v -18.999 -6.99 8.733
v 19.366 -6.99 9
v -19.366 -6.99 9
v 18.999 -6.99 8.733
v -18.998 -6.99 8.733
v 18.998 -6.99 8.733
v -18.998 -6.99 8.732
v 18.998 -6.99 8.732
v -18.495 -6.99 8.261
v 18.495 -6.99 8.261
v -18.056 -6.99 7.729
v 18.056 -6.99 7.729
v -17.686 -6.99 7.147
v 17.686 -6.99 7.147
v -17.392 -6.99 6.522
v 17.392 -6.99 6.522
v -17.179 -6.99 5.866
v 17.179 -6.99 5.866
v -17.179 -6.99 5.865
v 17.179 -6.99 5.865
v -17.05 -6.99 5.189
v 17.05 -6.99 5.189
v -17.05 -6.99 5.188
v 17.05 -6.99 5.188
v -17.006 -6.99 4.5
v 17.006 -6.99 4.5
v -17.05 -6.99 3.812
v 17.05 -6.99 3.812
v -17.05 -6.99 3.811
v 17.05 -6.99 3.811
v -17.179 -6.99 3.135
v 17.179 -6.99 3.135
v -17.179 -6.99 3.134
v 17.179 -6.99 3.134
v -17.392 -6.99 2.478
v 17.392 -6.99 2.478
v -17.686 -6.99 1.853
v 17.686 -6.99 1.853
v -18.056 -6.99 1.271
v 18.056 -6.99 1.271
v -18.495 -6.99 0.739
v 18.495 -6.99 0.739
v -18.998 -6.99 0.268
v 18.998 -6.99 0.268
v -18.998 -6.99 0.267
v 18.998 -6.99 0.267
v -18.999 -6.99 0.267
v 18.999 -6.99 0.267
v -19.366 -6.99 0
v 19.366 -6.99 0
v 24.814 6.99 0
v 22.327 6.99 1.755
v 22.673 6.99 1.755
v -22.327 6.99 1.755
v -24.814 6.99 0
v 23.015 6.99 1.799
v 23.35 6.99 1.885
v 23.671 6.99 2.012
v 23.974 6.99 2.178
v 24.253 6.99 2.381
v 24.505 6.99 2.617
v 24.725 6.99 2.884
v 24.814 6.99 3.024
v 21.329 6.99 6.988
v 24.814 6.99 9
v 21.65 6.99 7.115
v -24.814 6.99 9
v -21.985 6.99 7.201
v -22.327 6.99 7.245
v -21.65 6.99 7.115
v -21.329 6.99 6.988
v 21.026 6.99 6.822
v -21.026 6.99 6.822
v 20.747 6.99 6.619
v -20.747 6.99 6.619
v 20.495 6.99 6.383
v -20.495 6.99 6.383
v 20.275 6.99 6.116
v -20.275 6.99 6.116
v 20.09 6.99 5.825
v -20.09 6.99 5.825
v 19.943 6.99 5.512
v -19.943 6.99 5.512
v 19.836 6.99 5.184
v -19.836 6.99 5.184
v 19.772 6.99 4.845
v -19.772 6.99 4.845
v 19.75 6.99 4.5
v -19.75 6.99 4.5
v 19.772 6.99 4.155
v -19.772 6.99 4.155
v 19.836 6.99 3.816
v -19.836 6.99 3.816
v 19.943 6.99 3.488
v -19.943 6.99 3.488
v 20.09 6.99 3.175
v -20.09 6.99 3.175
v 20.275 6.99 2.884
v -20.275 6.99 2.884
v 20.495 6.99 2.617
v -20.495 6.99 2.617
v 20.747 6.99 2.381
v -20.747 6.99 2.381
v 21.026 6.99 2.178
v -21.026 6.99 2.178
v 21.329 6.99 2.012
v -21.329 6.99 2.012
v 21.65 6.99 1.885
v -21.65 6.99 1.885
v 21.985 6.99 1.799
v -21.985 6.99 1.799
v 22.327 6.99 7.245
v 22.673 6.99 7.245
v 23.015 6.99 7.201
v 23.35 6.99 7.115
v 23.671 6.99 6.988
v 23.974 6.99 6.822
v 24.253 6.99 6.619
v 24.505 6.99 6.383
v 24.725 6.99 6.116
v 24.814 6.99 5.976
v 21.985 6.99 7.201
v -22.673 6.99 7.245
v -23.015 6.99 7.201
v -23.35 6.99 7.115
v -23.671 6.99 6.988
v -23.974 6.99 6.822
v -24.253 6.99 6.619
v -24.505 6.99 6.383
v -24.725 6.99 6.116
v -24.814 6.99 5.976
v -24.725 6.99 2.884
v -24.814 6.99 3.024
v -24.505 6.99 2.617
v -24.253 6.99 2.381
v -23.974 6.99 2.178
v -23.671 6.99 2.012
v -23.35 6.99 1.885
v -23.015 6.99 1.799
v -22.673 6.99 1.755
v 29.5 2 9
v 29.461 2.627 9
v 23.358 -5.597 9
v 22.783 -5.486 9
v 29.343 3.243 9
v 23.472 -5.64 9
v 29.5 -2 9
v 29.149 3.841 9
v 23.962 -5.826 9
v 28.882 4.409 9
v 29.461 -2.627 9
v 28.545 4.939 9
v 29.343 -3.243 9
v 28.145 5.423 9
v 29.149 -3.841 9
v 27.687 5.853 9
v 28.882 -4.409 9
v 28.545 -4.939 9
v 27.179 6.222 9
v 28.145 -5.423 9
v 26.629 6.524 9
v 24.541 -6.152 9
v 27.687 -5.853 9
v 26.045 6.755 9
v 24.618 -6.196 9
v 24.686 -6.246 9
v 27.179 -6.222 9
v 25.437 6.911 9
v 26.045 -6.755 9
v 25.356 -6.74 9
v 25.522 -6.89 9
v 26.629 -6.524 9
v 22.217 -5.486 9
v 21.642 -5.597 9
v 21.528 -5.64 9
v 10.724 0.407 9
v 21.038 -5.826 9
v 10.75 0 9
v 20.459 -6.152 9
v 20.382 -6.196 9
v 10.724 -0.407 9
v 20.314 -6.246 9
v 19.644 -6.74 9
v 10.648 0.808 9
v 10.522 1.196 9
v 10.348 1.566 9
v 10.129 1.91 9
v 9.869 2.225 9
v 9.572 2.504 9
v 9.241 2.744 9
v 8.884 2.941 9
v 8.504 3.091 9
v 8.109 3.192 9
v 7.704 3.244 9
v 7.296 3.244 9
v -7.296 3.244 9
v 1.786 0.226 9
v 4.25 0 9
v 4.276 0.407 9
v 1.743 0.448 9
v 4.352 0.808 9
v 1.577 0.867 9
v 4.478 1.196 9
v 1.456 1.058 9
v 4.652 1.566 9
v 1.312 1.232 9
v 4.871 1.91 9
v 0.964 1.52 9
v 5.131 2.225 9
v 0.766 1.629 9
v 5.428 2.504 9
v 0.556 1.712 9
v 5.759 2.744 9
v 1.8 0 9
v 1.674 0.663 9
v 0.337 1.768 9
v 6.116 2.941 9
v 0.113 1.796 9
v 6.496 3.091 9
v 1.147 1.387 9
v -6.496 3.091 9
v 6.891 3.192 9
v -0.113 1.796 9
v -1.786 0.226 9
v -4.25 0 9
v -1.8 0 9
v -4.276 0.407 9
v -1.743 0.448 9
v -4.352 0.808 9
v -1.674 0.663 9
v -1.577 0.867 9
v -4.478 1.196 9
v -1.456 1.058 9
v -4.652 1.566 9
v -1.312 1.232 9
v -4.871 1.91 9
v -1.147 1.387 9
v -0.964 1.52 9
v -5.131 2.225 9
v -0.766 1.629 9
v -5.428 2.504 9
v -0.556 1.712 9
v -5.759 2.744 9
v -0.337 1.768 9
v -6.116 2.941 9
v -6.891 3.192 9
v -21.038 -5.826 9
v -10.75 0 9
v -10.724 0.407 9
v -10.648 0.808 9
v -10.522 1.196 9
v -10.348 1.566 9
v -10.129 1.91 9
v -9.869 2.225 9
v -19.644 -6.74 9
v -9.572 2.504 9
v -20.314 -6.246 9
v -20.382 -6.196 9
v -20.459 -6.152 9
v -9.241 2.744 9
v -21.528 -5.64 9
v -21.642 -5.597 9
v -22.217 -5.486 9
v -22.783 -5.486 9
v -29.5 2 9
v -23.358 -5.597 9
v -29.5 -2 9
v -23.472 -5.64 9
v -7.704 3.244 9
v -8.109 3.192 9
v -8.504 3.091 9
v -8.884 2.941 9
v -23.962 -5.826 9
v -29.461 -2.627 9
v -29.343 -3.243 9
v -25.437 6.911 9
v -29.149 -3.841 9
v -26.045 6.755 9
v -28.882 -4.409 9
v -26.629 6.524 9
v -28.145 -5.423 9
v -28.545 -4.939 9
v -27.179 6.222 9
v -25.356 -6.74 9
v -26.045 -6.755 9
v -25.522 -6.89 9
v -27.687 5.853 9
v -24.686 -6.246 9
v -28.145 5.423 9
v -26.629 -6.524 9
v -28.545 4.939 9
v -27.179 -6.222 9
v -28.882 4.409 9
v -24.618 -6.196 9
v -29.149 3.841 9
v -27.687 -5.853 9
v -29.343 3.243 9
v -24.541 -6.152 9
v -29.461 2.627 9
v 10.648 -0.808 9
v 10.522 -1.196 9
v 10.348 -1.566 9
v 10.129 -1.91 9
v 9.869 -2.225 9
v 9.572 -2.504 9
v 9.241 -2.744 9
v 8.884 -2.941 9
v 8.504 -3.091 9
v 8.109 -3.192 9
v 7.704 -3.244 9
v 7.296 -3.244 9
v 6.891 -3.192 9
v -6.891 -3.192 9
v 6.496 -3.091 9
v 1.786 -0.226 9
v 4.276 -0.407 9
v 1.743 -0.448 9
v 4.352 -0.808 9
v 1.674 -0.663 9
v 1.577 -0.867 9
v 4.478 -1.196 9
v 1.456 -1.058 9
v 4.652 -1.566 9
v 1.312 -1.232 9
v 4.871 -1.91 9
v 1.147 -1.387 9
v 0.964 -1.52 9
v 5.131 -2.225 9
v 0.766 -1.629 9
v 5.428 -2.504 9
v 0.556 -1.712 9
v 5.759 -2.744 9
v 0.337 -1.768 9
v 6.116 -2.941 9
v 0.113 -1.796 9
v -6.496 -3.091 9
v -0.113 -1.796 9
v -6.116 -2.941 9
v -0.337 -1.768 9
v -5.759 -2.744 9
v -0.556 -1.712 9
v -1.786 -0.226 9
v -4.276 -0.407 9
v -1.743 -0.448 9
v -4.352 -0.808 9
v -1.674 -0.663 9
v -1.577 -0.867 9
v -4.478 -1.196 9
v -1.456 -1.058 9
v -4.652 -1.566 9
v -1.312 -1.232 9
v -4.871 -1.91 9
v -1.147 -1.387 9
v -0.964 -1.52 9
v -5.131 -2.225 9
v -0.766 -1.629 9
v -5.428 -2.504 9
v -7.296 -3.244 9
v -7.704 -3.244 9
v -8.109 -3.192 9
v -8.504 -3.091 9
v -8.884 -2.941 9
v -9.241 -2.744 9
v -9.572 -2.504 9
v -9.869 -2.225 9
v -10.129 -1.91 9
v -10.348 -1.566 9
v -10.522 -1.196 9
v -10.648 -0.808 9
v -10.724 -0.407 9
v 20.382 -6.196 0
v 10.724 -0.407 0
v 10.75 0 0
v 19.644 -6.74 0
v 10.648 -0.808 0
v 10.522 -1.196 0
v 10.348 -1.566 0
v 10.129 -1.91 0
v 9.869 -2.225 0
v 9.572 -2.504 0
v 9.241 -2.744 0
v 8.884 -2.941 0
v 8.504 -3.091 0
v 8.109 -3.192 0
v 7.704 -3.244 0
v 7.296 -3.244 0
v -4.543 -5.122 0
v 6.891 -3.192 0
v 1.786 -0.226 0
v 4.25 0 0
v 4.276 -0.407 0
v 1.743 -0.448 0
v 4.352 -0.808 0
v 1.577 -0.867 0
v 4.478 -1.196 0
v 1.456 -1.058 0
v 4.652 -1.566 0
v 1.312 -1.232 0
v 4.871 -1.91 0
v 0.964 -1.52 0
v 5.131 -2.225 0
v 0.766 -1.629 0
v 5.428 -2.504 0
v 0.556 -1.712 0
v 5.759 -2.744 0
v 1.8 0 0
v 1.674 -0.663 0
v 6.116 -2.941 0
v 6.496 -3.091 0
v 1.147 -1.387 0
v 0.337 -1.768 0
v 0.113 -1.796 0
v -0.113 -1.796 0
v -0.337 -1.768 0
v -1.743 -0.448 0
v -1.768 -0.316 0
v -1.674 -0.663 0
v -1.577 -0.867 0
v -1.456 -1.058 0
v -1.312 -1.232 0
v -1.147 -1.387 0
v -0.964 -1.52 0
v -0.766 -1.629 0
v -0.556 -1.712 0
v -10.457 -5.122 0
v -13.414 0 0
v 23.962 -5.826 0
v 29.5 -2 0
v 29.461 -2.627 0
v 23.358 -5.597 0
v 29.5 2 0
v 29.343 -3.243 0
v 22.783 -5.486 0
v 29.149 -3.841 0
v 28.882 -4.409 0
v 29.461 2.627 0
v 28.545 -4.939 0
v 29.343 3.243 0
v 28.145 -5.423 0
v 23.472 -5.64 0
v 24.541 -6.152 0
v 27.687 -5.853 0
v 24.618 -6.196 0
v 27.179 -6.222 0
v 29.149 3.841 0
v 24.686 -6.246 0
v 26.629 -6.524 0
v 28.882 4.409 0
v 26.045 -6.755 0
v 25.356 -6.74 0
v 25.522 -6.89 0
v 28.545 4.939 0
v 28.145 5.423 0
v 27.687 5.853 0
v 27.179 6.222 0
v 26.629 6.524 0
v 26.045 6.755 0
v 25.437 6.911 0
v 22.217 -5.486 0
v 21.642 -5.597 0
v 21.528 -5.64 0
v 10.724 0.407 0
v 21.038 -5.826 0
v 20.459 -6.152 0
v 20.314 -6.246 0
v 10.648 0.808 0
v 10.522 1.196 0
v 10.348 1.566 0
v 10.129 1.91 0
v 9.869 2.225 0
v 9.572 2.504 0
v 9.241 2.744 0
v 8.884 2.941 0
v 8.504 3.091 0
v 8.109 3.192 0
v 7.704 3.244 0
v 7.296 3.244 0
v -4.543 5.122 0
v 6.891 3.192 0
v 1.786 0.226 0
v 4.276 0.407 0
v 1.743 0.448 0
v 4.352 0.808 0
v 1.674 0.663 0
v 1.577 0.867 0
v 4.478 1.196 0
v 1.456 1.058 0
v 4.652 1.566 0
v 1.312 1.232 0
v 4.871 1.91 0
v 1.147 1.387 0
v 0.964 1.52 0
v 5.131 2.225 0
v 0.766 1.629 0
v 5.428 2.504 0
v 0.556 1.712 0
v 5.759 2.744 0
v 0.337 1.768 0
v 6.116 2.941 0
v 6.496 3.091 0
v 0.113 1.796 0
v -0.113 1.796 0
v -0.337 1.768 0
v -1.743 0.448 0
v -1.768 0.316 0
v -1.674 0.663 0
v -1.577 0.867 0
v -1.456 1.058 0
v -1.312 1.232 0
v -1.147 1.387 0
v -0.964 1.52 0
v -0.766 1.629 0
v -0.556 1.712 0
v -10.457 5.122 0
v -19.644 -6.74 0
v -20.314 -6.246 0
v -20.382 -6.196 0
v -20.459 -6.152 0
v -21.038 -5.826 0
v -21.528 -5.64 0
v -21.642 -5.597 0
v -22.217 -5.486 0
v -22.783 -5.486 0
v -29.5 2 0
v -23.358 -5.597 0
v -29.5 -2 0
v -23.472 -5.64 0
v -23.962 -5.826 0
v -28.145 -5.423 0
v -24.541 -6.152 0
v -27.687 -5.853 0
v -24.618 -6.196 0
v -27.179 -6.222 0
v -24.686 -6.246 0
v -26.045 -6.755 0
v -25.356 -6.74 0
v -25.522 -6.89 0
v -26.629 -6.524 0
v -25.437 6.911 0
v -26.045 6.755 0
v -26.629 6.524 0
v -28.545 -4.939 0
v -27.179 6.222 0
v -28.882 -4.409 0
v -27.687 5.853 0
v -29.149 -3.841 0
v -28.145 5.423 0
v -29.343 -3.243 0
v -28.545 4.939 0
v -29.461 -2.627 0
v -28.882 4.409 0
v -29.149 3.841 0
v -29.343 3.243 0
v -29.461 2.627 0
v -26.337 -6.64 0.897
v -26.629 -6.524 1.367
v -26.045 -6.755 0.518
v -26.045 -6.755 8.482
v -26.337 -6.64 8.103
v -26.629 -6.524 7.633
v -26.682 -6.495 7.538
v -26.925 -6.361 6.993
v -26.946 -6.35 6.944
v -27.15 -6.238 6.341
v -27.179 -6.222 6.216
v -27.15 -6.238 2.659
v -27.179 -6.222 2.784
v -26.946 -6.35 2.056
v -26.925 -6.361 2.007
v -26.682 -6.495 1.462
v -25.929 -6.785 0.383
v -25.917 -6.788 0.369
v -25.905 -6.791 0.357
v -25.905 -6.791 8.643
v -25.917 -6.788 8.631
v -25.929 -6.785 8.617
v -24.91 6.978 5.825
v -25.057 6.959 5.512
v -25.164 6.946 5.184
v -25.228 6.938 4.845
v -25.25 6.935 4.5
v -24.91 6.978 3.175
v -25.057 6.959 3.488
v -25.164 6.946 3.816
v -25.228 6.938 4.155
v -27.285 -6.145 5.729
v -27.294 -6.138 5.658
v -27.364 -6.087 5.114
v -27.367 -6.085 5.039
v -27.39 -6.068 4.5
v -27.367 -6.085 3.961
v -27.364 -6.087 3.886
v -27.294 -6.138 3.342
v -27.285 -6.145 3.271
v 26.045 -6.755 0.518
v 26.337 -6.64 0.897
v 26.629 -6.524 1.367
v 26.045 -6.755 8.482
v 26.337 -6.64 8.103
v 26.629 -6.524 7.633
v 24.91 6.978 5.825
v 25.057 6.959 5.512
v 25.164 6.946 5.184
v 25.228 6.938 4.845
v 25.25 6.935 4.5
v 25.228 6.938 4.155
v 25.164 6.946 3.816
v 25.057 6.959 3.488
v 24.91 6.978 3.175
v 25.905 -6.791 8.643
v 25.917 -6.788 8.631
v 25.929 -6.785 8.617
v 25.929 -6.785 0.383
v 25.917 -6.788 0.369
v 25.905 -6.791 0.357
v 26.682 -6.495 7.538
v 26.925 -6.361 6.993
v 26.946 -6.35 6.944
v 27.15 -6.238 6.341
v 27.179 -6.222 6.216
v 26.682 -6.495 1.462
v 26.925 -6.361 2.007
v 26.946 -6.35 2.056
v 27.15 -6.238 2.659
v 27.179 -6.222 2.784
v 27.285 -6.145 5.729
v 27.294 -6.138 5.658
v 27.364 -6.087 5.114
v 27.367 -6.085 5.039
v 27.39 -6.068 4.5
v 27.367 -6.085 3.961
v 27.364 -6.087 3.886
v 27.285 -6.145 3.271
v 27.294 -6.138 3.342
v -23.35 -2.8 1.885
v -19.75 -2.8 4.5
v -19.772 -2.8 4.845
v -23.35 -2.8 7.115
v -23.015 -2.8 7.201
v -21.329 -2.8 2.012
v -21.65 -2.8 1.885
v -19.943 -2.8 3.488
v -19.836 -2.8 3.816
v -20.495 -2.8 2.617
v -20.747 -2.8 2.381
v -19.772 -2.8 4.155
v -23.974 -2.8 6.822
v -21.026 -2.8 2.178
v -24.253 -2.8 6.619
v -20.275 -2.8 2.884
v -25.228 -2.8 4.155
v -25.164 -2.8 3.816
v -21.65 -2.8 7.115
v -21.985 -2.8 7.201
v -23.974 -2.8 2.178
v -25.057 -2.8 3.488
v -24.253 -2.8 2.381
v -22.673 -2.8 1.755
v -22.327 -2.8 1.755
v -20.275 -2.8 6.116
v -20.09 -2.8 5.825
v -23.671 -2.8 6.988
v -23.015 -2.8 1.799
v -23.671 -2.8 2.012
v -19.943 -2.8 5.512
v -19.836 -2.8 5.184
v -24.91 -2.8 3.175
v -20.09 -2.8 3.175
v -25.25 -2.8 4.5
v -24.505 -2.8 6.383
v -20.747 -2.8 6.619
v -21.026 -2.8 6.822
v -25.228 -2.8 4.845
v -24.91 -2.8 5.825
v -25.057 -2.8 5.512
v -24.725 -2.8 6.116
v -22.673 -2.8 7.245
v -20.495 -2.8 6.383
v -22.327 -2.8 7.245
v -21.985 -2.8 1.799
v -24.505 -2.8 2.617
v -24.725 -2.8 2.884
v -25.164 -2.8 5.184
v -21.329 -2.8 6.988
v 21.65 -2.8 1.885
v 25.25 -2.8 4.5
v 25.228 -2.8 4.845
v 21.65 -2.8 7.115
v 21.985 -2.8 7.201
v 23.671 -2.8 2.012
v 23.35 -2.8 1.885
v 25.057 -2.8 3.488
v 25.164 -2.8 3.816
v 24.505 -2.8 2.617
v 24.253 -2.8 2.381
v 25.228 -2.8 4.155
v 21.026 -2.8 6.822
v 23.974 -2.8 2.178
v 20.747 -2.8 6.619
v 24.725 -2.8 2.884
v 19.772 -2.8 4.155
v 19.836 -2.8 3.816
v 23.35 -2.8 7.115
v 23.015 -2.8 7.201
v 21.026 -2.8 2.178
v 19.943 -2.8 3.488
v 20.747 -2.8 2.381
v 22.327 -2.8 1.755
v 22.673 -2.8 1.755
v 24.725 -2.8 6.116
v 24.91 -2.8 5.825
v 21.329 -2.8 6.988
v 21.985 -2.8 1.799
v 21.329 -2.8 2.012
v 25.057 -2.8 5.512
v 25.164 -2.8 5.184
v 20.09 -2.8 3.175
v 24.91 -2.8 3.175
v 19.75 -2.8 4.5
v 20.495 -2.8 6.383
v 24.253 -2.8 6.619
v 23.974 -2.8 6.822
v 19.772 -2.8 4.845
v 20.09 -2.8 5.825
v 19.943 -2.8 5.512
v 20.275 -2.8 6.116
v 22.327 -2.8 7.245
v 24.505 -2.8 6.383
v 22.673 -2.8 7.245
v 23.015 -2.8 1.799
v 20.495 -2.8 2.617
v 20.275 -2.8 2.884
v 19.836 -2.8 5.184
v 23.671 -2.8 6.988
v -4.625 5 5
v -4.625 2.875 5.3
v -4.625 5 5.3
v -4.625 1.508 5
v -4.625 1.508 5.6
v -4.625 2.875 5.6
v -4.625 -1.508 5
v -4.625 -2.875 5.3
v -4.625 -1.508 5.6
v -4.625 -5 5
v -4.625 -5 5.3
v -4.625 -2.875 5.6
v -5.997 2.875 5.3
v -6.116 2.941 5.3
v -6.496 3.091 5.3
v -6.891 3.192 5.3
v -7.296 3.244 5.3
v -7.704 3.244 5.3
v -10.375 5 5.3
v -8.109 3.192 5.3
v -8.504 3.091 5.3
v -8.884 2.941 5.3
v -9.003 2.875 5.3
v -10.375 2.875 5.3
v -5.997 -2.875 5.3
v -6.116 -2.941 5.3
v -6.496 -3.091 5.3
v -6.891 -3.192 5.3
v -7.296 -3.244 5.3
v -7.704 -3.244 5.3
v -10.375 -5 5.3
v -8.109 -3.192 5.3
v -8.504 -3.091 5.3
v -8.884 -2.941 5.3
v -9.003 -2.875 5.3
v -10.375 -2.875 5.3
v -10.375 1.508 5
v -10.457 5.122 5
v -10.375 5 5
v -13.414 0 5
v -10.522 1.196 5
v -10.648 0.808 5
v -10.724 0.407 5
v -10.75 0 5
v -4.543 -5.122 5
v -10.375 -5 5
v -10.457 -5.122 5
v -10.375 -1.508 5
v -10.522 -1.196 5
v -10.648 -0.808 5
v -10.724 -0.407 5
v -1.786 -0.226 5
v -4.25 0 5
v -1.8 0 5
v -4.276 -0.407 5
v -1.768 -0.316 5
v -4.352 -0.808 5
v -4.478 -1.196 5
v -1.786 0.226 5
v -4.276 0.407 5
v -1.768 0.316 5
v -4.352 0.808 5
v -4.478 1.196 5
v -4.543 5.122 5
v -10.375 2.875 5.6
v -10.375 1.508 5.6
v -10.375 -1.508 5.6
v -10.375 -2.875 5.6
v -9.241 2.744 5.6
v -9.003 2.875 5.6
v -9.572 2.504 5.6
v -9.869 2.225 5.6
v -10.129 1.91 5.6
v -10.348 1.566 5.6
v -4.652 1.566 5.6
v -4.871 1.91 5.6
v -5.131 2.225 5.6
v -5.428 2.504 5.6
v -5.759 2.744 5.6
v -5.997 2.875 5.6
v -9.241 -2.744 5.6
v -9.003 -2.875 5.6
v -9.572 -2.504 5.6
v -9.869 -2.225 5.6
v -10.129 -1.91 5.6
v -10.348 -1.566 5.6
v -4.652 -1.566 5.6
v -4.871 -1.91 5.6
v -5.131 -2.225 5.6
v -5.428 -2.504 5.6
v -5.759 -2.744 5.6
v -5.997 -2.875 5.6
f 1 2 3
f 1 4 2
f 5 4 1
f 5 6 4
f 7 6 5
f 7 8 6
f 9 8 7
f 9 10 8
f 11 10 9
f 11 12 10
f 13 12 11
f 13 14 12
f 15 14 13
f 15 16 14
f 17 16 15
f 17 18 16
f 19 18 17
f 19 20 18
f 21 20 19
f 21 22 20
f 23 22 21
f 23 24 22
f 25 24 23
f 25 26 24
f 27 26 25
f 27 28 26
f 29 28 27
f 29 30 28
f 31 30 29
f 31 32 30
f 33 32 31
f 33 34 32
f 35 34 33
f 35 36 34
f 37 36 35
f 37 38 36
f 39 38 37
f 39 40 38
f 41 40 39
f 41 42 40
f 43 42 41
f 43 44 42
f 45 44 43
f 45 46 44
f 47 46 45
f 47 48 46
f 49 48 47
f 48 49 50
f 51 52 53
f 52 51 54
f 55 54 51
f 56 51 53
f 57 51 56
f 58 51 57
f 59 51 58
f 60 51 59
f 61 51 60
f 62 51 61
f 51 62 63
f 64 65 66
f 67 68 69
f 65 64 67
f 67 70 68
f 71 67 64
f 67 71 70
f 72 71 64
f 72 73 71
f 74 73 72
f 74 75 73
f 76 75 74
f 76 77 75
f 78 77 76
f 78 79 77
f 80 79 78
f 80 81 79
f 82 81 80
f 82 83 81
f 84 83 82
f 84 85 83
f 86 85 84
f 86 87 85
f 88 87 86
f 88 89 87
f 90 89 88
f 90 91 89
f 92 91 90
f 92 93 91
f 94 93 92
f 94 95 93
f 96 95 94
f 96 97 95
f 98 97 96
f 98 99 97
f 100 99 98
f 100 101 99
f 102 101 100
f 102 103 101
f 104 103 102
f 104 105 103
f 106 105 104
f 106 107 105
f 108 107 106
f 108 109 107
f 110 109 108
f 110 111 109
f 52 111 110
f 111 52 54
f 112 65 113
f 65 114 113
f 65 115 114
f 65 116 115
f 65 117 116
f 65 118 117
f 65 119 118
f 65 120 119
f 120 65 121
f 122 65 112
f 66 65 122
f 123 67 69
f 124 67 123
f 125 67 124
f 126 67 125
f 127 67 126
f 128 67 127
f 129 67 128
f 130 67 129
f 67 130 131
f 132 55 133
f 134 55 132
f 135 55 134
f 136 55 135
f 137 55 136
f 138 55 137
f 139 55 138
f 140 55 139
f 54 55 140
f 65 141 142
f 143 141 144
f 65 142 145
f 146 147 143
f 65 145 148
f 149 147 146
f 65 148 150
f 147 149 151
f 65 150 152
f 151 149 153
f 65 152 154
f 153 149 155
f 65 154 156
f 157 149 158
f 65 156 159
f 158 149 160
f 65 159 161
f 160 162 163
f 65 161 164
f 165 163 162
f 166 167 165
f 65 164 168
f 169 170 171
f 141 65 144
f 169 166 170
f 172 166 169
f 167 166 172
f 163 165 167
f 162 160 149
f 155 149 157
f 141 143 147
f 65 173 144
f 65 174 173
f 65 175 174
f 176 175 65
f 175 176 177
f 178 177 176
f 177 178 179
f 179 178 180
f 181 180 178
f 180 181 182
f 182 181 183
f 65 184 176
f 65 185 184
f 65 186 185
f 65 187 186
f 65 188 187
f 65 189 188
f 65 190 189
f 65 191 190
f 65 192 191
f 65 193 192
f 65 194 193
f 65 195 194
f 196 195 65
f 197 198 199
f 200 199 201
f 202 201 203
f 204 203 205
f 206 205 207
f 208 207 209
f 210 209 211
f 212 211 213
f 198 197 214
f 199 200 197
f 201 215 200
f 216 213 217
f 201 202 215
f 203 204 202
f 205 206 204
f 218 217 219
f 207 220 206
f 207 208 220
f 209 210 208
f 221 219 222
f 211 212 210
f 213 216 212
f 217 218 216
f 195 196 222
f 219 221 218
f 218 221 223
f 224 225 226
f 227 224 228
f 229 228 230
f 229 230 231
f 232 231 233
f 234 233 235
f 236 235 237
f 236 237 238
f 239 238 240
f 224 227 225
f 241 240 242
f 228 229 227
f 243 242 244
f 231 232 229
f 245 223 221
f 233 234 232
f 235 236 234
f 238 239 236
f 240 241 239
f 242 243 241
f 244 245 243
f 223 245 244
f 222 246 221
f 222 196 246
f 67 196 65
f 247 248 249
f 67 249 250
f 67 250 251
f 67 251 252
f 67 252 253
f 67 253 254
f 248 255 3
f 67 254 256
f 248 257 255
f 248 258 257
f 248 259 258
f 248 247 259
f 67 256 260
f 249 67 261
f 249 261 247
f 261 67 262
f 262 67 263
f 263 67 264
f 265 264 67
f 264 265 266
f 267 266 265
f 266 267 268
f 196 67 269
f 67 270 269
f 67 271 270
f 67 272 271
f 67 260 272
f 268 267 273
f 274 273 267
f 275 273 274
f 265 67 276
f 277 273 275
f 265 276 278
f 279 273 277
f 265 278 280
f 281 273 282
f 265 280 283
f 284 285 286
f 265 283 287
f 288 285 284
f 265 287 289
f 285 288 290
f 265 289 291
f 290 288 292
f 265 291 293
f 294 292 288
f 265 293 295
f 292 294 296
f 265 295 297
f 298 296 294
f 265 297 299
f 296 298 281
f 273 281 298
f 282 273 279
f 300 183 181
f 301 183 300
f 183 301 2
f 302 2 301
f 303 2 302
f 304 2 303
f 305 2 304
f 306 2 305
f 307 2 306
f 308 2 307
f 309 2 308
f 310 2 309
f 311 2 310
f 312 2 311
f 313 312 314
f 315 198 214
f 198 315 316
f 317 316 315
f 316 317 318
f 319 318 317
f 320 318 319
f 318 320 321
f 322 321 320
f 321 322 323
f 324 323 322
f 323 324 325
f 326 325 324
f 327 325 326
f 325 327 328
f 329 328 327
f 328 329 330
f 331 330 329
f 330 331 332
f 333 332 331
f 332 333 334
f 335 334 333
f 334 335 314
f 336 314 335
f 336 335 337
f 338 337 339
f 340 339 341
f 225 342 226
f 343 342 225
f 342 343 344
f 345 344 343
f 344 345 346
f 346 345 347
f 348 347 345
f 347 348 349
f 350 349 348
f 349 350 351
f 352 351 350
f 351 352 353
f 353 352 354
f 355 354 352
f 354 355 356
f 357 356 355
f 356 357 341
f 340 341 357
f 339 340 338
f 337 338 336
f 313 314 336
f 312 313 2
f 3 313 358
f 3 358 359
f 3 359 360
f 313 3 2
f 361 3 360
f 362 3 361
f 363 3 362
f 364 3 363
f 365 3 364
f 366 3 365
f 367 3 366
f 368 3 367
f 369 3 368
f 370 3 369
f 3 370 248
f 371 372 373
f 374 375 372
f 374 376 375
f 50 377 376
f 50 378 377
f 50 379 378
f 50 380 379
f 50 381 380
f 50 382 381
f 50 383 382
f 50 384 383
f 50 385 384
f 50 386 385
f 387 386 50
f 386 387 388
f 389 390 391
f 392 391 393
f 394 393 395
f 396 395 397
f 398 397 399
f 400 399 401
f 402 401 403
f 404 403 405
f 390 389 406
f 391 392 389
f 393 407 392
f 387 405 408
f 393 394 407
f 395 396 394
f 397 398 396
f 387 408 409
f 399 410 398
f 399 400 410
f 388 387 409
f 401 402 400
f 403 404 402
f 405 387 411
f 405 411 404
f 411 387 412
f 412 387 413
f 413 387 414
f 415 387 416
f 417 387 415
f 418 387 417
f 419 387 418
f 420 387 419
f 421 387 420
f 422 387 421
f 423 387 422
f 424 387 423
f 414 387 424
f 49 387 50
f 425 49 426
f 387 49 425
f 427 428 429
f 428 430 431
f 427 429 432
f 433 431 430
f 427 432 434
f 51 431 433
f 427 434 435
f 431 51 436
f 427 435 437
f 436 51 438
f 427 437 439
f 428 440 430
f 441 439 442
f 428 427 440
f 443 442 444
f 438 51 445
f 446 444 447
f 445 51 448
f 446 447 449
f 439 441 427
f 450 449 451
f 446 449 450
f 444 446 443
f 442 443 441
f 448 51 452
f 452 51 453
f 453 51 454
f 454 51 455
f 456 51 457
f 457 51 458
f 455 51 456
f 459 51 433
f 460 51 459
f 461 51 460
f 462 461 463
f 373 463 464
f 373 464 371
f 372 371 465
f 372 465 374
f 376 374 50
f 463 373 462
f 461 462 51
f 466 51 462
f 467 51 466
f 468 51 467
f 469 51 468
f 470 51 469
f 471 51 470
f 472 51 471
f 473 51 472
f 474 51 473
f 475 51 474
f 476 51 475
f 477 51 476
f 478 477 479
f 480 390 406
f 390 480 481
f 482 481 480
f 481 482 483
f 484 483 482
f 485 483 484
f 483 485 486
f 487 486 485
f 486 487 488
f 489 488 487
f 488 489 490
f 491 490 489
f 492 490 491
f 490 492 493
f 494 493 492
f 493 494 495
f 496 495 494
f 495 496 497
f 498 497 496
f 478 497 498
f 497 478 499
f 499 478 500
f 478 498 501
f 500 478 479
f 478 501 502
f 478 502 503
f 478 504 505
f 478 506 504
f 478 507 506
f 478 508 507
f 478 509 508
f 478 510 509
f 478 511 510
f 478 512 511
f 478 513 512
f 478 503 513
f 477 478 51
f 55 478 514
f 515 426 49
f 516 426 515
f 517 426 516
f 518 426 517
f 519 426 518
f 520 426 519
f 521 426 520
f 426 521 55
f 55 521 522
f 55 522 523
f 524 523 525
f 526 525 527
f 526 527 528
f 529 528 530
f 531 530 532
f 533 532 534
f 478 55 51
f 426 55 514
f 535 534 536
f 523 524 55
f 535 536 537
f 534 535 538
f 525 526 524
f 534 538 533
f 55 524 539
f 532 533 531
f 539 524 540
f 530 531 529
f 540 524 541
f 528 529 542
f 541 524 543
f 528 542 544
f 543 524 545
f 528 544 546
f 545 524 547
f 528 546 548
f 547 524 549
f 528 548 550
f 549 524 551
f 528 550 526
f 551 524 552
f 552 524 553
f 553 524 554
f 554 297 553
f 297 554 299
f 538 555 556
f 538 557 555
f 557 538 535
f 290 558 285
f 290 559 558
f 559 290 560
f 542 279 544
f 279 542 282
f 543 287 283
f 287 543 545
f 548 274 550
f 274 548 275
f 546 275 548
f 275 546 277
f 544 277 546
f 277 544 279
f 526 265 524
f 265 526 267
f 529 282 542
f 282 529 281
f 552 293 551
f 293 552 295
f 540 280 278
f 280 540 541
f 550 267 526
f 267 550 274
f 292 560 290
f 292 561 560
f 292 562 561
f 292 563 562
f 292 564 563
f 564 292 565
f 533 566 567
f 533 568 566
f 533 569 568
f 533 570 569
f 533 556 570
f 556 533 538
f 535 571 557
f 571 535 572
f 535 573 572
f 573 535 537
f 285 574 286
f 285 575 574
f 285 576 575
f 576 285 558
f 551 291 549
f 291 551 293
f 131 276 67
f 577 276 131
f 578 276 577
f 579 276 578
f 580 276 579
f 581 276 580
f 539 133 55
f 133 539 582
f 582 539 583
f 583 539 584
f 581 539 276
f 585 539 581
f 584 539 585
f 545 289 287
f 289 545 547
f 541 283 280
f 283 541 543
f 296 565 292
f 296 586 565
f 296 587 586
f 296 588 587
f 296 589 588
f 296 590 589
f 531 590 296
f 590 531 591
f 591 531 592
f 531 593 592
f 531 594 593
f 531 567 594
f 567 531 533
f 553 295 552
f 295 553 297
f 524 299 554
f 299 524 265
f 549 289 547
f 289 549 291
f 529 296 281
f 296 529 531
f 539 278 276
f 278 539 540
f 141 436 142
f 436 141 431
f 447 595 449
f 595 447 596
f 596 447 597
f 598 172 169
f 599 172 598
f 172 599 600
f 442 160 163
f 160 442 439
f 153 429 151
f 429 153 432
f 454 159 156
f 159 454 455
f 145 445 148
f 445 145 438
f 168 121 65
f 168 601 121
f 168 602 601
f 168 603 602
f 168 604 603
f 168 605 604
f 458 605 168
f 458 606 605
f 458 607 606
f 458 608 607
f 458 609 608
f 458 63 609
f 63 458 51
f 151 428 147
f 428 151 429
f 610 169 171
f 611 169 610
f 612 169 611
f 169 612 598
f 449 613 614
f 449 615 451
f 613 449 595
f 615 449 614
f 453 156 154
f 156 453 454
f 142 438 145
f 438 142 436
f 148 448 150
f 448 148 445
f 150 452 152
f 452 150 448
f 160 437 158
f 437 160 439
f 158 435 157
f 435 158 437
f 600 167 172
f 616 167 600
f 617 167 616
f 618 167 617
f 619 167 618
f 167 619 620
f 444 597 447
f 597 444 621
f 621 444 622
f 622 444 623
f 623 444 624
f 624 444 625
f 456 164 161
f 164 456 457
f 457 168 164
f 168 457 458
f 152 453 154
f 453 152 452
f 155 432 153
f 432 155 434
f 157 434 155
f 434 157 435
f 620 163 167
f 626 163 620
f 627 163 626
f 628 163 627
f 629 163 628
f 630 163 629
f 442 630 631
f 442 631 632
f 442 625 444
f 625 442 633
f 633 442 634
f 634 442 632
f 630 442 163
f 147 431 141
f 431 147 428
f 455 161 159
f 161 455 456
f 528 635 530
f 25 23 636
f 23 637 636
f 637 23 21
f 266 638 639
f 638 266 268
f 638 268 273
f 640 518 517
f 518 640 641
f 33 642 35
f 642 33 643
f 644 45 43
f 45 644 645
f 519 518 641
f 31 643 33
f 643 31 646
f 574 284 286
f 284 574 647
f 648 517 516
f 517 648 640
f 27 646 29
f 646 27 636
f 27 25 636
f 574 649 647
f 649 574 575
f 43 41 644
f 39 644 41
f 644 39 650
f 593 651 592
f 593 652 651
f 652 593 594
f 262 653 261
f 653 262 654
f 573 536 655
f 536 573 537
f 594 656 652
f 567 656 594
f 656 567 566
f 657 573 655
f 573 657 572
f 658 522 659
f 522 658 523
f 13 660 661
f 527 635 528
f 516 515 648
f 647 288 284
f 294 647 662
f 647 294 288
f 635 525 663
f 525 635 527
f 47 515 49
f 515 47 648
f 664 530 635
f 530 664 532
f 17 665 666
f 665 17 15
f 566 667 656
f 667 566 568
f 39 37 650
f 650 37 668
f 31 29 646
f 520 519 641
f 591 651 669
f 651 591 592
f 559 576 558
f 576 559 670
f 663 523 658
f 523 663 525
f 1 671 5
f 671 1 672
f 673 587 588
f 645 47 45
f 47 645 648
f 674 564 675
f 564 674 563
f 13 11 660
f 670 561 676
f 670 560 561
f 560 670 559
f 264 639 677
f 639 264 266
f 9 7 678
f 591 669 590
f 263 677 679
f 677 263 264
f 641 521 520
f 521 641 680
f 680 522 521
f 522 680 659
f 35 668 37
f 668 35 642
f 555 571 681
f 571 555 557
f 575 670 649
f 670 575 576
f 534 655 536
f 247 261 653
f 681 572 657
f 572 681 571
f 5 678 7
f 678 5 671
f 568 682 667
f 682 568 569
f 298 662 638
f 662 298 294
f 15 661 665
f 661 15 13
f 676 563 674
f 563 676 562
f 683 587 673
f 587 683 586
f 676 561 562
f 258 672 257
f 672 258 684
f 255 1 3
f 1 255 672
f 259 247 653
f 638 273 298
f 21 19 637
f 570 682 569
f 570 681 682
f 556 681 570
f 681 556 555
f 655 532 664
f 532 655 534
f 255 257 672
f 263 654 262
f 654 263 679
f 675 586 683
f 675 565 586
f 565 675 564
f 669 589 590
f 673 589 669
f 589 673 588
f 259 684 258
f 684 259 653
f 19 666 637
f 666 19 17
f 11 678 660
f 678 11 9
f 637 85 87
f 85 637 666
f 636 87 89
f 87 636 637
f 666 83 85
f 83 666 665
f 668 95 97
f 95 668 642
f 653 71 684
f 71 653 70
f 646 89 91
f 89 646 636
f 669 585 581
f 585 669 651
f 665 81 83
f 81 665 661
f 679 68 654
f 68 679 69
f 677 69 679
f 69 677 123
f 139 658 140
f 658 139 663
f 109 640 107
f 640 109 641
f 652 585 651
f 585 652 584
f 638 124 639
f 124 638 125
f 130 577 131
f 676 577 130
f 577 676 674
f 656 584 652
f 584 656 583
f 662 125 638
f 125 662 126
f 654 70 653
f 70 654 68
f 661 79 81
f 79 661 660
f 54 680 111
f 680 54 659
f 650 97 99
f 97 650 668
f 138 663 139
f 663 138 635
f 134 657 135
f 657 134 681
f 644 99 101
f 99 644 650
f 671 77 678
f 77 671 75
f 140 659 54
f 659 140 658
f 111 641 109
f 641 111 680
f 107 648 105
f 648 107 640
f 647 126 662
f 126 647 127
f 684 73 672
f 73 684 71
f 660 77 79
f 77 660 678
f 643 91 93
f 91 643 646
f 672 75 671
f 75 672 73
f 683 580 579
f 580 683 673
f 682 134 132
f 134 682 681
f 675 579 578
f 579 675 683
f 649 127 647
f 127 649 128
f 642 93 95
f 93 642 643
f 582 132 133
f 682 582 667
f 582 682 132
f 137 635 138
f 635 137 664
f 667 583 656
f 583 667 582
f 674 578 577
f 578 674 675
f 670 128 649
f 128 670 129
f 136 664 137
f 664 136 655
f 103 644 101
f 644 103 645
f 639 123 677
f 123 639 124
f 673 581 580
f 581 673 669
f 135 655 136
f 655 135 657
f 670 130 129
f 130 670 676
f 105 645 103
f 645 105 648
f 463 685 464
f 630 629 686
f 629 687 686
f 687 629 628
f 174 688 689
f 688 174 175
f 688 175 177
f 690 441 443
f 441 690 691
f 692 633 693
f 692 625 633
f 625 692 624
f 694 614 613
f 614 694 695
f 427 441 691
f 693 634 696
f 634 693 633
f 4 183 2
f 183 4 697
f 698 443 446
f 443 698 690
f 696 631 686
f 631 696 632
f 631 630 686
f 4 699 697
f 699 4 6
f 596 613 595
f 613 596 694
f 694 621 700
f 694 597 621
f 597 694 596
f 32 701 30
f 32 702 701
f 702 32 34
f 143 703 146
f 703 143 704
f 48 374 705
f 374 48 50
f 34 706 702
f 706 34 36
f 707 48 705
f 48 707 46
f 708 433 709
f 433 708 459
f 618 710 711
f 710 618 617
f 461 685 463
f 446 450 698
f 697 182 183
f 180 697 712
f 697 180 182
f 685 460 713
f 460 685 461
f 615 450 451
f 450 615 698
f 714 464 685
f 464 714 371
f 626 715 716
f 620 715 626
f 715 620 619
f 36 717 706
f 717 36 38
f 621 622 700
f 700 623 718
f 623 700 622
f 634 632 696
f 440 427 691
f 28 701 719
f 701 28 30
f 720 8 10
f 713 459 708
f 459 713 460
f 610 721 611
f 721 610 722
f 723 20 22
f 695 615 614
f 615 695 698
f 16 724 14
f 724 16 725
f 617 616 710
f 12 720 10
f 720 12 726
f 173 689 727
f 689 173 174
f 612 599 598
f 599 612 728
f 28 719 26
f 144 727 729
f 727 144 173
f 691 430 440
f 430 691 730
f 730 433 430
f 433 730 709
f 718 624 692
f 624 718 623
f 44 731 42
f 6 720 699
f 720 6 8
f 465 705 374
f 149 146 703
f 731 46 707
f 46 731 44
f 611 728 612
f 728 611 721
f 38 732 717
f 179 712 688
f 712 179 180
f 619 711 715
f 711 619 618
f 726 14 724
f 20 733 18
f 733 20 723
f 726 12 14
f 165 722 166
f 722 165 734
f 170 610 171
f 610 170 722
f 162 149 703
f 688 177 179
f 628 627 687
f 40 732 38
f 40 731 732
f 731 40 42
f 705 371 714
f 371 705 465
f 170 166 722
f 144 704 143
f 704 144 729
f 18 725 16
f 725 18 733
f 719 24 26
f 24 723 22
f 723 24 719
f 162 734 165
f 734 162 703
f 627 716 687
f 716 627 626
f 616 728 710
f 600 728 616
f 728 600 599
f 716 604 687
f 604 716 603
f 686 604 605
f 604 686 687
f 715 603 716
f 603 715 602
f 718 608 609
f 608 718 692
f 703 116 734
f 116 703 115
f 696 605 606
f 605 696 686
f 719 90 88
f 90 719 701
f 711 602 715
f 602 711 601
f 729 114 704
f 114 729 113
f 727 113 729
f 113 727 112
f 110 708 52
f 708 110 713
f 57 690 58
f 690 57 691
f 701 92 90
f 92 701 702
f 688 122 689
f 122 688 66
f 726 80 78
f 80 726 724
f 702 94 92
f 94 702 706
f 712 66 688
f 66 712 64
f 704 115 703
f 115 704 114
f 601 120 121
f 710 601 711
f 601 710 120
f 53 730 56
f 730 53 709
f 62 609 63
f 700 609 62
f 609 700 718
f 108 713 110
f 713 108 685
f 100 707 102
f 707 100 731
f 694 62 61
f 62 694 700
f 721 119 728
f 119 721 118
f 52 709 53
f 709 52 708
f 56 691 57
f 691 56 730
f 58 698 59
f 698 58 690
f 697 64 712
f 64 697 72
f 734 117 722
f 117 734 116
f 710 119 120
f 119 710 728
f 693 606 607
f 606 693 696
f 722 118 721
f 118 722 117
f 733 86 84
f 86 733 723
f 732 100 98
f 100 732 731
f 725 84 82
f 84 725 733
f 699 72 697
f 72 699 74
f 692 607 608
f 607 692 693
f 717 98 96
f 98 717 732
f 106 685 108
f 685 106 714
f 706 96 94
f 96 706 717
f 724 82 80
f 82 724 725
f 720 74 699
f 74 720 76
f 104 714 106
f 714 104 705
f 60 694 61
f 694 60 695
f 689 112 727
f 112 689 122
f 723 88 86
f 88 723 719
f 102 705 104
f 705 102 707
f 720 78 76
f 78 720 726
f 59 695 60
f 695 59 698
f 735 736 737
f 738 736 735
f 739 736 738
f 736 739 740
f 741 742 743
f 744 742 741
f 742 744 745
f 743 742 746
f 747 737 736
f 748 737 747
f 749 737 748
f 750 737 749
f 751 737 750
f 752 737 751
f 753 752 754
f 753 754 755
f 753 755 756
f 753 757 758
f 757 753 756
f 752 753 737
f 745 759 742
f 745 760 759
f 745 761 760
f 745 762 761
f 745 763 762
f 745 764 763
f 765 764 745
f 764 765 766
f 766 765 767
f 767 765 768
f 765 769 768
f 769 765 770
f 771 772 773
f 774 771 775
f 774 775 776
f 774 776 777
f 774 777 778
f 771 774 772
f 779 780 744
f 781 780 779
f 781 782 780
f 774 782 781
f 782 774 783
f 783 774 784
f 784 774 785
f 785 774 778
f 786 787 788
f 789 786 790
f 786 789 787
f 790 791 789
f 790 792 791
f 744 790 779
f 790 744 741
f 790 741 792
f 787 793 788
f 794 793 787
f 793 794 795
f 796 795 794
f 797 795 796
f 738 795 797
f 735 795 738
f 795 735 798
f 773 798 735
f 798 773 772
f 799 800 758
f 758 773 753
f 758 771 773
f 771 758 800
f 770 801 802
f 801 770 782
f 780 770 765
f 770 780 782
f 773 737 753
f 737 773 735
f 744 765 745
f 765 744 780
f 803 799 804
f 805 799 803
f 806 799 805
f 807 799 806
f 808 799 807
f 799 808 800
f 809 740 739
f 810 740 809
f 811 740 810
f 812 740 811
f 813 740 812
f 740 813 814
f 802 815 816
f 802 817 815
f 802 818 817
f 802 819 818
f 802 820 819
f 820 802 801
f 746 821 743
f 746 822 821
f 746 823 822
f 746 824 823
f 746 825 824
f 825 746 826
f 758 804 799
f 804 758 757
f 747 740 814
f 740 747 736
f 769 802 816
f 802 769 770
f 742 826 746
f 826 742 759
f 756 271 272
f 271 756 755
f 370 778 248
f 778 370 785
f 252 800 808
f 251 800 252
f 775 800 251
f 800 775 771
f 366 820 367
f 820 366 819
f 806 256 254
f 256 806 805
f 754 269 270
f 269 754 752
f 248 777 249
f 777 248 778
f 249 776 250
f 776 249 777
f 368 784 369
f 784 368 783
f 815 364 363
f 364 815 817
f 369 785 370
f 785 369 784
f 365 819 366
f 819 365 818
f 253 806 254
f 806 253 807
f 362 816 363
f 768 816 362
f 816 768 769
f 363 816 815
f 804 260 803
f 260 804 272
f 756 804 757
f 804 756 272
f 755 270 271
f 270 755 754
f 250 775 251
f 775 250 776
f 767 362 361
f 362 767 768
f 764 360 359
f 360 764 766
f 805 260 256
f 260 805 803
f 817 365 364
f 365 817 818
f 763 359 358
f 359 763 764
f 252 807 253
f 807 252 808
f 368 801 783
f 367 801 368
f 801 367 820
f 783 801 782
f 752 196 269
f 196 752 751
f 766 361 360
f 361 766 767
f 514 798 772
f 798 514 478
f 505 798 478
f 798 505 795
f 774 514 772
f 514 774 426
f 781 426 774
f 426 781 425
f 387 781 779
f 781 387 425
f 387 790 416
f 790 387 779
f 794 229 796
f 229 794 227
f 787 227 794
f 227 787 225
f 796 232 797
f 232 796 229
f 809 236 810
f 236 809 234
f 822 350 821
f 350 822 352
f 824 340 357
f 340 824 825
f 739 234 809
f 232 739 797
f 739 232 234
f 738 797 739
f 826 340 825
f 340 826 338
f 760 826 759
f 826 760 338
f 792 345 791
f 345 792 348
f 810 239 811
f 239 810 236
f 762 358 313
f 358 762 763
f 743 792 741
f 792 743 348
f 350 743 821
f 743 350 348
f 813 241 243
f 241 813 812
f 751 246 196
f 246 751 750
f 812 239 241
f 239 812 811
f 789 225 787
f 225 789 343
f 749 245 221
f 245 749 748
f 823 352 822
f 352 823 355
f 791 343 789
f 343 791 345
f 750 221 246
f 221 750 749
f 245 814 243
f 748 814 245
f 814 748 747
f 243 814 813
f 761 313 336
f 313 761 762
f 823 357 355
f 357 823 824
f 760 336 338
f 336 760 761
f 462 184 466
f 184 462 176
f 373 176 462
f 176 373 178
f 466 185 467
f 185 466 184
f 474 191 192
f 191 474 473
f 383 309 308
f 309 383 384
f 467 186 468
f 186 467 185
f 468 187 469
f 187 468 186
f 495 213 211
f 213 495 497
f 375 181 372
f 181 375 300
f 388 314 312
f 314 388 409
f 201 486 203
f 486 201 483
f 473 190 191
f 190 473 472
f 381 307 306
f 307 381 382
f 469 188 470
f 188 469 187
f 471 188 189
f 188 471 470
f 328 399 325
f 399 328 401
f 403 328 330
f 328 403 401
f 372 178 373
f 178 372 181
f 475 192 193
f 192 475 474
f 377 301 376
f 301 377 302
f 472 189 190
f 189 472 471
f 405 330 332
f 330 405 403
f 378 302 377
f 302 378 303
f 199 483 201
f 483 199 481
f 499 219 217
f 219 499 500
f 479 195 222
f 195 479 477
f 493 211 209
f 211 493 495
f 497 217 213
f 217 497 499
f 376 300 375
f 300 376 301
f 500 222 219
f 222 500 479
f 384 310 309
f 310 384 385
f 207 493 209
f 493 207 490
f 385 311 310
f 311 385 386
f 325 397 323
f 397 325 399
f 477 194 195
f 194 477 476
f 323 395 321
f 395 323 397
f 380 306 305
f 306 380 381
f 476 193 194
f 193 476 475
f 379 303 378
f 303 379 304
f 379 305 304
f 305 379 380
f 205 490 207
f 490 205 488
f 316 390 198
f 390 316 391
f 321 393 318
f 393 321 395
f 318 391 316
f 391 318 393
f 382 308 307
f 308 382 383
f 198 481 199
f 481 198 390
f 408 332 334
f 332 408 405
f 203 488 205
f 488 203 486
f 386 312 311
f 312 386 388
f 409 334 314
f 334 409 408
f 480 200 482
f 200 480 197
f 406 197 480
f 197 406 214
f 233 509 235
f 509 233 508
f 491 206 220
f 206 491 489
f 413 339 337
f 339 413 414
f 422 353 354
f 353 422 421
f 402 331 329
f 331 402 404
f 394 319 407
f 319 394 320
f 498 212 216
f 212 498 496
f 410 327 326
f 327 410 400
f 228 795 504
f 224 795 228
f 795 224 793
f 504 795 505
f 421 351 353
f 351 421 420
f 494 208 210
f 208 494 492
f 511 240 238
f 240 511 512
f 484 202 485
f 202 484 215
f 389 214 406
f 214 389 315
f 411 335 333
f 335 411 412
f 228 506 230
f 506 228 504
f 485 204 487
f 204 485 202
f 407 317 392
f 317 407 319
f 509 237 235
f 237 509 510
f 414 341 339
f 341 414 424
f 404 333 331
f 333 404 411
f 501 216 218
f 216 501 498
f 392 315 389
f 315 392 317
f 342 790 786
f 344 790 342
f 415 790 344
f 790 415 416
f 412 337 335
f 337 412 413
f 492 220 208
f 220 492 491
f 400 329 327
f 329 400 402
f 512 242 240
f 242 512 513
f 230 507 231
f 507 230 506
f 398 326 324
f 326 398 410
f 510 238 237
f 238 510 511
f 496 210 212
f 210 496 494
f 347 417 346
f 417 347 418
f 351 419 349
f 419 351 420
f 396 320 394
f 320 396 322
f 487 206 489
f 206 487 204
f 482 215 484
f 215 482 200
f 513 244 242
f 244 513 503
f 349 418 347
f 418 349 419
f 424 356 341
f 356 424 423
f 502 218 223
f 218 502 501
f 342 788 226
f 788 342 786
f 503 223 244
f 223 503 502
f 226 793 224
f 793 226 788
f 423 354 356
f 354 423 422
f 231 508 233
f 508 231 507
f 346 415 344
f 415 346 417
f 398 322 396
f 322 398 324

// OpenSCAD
$fn = 50;


difference() {
	union() {
		hull() {
			translate(v = [-9.5000000000, 2.0000000000, 0]) {
				cylinder(h = 9, r = 5);
			}
			translate(v = [9.5000000000, 2.0000000000, 0]) {
				cylinder(h = 9, r = 5);
			}
			translate(v = [-9.5000000000, -2.0000000000, 0]) {
				cylinder(h = 9, r = 5);
			}
			translate(v = [9.5000000000, -2.0000000000, 0]) {
				cylinder(h = 9, r = 5);
			}
		}
		translate(v = [-15.0000000000, 0.0000000000, 0]) {
			hull() {
				translate(v = [-9.5000000000, 2.0000000000, 0]) {
					cylinder(h = 9, r = 5);
				}
				translate(v = [9.5000000000, 2.0000000000, 0]) {
					cylinder(h = 9, r = 5);
				}
				translate(v = [-9.5000000000, -2.0000000000, 0]) {
					cylinder(h = 9, r = 5);
				}
				translate(v = [9.5000000000, -2.0000000000, 0]) {
					cylinder(h = 9, r = 5);
				}
			}
		}
		translate(v = [15.0000000000, 0.0000000000, 0]) {
			hull() {
				translate(v = [-9.5000000000, 2.0000000000, 0]) {
					cylinder(h = 9, r = 5);
				}
				translate(v = [9.5000000000, 2.0000000000, 0]) {
					cylinder(h = 9, r = 5);
				}
				translate(v = [-9.5000000000, -2.0000000000, 0]) {
					cylinder(h = 9, r = 5);
				}
				translate(v = [9.5000000000, -2.0000000000, 0]) {
					cylinder(h = 9, r = 5);
				}
			}
		}
	}
	union() {
		translate(v = [-22.5000000000, -7.0000000000, 4.5000000000]) {
			rotate(a = [90, 0, 0]) {
				difference() {
					union() {
						#translate(v = [0, 0, -14.0000000000]) {
							cylinder(h = 14, r = 2.2500000000);
						}
						#translate(v = [0, 0, -4.2000000000]) {
							cylinder(h = 4.2000000000, r1 = 2.7500000000, r2 = 5.5000000000);
						}
						#translate(v = [0, 0, -14.0000000000]) {
							cylinder(h = 14, r = 2.7500000000);
						}
						#translate(v = [0, 0, -14.0000000000]) {
							cylinder(h = 14, r = 2.2500000000);
						}
					}
					union();
				}
			}
		}
		translate(v = [22.5000000000, -7.0000000000, 4.5000000000]) {
			rotate(a = [90, 0, 0]) {
				difference() {
					union() {
						#translate(v = [0, 0, -14.0000000000]) {
							cylinder(h = 14, r = 2.2500000000);
						}
						#translate(v = [0, 0, -4.2000000000]) {
							cylinder(h = 4.2000000000, r1 = 2.7500000000, r2 = 5.5000000000);
						}
						#translate(v = [0, 0, -14.0000000000]) {
							cylinder(h = 14, r = 2.7500000000);
						}
						#translate(v = [0, 0, -14.0000000000]) {
							cylinder(h = 14, r = 2.2500000000);
						}
					}
					union();
				}
			}
		}
		translate(v = [-7.5000000000, 0.0000000000, 0]) {
			rotate(a = [0, 0, 0]) {
				difference() {
					union() {
						#translate(v = [-2.8750000000, -5.0000000000, -0.3000000000]) {
							cube(size = [5.7500000000, 10, 0.3000000000]);
						}
						#translate(v = [-2.8750000000, -2.8750000000, -0.6000000000]) {
							cube(size = [5.7500000000, 5.7500000000, 0.3000000000]);
						}
						#translate(v = [-2.8750000000, -5.0000000000, 5]) {
							cube(size = [5.7500000000, 10, 0.3000000000]);
						}
						#translate(v = [-2.8750000000, -2.8750000000, 5.3000000000]) {
							cube(size = [5.7500000000, 5.7500000000, 0.3000000000]);
						}
						#translate(v = [0, 0, -100.0000000000]) {
							cylinder(h = 200, r = 3.2500000000);
						}
						#linear_extrude(height = 5) {
							polygon(points = [[5.9142500000, 0.0000000000], [2.9571250000, 5.1218907443], [-2.9571250000, 5.1218907443], [-5.9142500000, 0.0000000000], [-2.9571250000, -5.1218907443], [2.9571250000, -5.1218907443]]);
						}
						#translate(v = [-2.8750000000, -5.0000000000, -0.3000000000]) {
							cube(size = [5.7500000000, 10, 0.3000000000]);
						}
						#translate(v = [-2.8750000000, -2.8750000000, -0.6000000000]) {
							cube(size = [5.7500000000, 5.7500000000, 0.3000000000]);
						}
						#translate(v = [-2.8750000000, -5.0000000000, 5]) {
							cube(size = [5.7500000000, 10, 0.3000000000]);
						}
						#translate(v = [-2.8750000000, -2.8750000000, 5.3000000000]) {
							cube(size = [5.7500000000, 5.7500000000, 0.3000000000]);
						}
						#translate(v = [0, 0, -100.0000000000]) {
							cylinder(h = 200, r = 3.2500000000);
						}
						#translate(v = [-2.8750000000, -5.0000000000, -0.3000000000]) {
							cube(size = [5.7500000000, 10, 0.3000000000]);
						}
						#translate(v = [-2.8750000000, -2.8750000000, -0.6000000000]) {
							cube(size = [5.7500000000, 5.7500000000, 0.3000000000]);
						}
						#translate(v = [-2.8750000000, -5.0000000000, 5]) {
							cube(size = [5.7500000000, 10, 0.3000000000]);
						}
						#translate(v = [-2.8750000000, -2.8750000000, 5.3000000000]) {
							cube(size = [5.7500000000, 5.7500000000, 0.3000000000]);
						}
						#translate(v = [0, 0, -100.0000000000]) {
							cylinder(h = 200, r = 3.2500000000);
						}
					}
					union();
				}
			}
		}
		translate(v = [-7.5000000000, 0.0000000000, 0]) {
			translate(v = [0, 0, -100]) {
				cylinder(h = 200, r = 3.2500000000);
			}
		}
		translate(v = [7.5000000000, 0.0000000000, 0]) {
			translate(v = [0, 0, -100]) {
				cylinder(h = 200, r = 3.2500000000);
			}
		}
		translate(v = [-7.5000000000, 0.0000000000, 0]) {
			translate(v = [0, 0, -100]) {
				cylinder(h = 200, r = 1.8000000000);
			}
		}
		translate(v = [0, 0, -100]) {
			cylinder(h = 200, r = 1.8000000000);
		}
		translate(v = [7.5000000000, 0.0000000000, 0]) {
			translate(v = [0, 0, -100]) {
				cylinder(h = 200, r = 1.8000000000);
			}
		}
	}
}
